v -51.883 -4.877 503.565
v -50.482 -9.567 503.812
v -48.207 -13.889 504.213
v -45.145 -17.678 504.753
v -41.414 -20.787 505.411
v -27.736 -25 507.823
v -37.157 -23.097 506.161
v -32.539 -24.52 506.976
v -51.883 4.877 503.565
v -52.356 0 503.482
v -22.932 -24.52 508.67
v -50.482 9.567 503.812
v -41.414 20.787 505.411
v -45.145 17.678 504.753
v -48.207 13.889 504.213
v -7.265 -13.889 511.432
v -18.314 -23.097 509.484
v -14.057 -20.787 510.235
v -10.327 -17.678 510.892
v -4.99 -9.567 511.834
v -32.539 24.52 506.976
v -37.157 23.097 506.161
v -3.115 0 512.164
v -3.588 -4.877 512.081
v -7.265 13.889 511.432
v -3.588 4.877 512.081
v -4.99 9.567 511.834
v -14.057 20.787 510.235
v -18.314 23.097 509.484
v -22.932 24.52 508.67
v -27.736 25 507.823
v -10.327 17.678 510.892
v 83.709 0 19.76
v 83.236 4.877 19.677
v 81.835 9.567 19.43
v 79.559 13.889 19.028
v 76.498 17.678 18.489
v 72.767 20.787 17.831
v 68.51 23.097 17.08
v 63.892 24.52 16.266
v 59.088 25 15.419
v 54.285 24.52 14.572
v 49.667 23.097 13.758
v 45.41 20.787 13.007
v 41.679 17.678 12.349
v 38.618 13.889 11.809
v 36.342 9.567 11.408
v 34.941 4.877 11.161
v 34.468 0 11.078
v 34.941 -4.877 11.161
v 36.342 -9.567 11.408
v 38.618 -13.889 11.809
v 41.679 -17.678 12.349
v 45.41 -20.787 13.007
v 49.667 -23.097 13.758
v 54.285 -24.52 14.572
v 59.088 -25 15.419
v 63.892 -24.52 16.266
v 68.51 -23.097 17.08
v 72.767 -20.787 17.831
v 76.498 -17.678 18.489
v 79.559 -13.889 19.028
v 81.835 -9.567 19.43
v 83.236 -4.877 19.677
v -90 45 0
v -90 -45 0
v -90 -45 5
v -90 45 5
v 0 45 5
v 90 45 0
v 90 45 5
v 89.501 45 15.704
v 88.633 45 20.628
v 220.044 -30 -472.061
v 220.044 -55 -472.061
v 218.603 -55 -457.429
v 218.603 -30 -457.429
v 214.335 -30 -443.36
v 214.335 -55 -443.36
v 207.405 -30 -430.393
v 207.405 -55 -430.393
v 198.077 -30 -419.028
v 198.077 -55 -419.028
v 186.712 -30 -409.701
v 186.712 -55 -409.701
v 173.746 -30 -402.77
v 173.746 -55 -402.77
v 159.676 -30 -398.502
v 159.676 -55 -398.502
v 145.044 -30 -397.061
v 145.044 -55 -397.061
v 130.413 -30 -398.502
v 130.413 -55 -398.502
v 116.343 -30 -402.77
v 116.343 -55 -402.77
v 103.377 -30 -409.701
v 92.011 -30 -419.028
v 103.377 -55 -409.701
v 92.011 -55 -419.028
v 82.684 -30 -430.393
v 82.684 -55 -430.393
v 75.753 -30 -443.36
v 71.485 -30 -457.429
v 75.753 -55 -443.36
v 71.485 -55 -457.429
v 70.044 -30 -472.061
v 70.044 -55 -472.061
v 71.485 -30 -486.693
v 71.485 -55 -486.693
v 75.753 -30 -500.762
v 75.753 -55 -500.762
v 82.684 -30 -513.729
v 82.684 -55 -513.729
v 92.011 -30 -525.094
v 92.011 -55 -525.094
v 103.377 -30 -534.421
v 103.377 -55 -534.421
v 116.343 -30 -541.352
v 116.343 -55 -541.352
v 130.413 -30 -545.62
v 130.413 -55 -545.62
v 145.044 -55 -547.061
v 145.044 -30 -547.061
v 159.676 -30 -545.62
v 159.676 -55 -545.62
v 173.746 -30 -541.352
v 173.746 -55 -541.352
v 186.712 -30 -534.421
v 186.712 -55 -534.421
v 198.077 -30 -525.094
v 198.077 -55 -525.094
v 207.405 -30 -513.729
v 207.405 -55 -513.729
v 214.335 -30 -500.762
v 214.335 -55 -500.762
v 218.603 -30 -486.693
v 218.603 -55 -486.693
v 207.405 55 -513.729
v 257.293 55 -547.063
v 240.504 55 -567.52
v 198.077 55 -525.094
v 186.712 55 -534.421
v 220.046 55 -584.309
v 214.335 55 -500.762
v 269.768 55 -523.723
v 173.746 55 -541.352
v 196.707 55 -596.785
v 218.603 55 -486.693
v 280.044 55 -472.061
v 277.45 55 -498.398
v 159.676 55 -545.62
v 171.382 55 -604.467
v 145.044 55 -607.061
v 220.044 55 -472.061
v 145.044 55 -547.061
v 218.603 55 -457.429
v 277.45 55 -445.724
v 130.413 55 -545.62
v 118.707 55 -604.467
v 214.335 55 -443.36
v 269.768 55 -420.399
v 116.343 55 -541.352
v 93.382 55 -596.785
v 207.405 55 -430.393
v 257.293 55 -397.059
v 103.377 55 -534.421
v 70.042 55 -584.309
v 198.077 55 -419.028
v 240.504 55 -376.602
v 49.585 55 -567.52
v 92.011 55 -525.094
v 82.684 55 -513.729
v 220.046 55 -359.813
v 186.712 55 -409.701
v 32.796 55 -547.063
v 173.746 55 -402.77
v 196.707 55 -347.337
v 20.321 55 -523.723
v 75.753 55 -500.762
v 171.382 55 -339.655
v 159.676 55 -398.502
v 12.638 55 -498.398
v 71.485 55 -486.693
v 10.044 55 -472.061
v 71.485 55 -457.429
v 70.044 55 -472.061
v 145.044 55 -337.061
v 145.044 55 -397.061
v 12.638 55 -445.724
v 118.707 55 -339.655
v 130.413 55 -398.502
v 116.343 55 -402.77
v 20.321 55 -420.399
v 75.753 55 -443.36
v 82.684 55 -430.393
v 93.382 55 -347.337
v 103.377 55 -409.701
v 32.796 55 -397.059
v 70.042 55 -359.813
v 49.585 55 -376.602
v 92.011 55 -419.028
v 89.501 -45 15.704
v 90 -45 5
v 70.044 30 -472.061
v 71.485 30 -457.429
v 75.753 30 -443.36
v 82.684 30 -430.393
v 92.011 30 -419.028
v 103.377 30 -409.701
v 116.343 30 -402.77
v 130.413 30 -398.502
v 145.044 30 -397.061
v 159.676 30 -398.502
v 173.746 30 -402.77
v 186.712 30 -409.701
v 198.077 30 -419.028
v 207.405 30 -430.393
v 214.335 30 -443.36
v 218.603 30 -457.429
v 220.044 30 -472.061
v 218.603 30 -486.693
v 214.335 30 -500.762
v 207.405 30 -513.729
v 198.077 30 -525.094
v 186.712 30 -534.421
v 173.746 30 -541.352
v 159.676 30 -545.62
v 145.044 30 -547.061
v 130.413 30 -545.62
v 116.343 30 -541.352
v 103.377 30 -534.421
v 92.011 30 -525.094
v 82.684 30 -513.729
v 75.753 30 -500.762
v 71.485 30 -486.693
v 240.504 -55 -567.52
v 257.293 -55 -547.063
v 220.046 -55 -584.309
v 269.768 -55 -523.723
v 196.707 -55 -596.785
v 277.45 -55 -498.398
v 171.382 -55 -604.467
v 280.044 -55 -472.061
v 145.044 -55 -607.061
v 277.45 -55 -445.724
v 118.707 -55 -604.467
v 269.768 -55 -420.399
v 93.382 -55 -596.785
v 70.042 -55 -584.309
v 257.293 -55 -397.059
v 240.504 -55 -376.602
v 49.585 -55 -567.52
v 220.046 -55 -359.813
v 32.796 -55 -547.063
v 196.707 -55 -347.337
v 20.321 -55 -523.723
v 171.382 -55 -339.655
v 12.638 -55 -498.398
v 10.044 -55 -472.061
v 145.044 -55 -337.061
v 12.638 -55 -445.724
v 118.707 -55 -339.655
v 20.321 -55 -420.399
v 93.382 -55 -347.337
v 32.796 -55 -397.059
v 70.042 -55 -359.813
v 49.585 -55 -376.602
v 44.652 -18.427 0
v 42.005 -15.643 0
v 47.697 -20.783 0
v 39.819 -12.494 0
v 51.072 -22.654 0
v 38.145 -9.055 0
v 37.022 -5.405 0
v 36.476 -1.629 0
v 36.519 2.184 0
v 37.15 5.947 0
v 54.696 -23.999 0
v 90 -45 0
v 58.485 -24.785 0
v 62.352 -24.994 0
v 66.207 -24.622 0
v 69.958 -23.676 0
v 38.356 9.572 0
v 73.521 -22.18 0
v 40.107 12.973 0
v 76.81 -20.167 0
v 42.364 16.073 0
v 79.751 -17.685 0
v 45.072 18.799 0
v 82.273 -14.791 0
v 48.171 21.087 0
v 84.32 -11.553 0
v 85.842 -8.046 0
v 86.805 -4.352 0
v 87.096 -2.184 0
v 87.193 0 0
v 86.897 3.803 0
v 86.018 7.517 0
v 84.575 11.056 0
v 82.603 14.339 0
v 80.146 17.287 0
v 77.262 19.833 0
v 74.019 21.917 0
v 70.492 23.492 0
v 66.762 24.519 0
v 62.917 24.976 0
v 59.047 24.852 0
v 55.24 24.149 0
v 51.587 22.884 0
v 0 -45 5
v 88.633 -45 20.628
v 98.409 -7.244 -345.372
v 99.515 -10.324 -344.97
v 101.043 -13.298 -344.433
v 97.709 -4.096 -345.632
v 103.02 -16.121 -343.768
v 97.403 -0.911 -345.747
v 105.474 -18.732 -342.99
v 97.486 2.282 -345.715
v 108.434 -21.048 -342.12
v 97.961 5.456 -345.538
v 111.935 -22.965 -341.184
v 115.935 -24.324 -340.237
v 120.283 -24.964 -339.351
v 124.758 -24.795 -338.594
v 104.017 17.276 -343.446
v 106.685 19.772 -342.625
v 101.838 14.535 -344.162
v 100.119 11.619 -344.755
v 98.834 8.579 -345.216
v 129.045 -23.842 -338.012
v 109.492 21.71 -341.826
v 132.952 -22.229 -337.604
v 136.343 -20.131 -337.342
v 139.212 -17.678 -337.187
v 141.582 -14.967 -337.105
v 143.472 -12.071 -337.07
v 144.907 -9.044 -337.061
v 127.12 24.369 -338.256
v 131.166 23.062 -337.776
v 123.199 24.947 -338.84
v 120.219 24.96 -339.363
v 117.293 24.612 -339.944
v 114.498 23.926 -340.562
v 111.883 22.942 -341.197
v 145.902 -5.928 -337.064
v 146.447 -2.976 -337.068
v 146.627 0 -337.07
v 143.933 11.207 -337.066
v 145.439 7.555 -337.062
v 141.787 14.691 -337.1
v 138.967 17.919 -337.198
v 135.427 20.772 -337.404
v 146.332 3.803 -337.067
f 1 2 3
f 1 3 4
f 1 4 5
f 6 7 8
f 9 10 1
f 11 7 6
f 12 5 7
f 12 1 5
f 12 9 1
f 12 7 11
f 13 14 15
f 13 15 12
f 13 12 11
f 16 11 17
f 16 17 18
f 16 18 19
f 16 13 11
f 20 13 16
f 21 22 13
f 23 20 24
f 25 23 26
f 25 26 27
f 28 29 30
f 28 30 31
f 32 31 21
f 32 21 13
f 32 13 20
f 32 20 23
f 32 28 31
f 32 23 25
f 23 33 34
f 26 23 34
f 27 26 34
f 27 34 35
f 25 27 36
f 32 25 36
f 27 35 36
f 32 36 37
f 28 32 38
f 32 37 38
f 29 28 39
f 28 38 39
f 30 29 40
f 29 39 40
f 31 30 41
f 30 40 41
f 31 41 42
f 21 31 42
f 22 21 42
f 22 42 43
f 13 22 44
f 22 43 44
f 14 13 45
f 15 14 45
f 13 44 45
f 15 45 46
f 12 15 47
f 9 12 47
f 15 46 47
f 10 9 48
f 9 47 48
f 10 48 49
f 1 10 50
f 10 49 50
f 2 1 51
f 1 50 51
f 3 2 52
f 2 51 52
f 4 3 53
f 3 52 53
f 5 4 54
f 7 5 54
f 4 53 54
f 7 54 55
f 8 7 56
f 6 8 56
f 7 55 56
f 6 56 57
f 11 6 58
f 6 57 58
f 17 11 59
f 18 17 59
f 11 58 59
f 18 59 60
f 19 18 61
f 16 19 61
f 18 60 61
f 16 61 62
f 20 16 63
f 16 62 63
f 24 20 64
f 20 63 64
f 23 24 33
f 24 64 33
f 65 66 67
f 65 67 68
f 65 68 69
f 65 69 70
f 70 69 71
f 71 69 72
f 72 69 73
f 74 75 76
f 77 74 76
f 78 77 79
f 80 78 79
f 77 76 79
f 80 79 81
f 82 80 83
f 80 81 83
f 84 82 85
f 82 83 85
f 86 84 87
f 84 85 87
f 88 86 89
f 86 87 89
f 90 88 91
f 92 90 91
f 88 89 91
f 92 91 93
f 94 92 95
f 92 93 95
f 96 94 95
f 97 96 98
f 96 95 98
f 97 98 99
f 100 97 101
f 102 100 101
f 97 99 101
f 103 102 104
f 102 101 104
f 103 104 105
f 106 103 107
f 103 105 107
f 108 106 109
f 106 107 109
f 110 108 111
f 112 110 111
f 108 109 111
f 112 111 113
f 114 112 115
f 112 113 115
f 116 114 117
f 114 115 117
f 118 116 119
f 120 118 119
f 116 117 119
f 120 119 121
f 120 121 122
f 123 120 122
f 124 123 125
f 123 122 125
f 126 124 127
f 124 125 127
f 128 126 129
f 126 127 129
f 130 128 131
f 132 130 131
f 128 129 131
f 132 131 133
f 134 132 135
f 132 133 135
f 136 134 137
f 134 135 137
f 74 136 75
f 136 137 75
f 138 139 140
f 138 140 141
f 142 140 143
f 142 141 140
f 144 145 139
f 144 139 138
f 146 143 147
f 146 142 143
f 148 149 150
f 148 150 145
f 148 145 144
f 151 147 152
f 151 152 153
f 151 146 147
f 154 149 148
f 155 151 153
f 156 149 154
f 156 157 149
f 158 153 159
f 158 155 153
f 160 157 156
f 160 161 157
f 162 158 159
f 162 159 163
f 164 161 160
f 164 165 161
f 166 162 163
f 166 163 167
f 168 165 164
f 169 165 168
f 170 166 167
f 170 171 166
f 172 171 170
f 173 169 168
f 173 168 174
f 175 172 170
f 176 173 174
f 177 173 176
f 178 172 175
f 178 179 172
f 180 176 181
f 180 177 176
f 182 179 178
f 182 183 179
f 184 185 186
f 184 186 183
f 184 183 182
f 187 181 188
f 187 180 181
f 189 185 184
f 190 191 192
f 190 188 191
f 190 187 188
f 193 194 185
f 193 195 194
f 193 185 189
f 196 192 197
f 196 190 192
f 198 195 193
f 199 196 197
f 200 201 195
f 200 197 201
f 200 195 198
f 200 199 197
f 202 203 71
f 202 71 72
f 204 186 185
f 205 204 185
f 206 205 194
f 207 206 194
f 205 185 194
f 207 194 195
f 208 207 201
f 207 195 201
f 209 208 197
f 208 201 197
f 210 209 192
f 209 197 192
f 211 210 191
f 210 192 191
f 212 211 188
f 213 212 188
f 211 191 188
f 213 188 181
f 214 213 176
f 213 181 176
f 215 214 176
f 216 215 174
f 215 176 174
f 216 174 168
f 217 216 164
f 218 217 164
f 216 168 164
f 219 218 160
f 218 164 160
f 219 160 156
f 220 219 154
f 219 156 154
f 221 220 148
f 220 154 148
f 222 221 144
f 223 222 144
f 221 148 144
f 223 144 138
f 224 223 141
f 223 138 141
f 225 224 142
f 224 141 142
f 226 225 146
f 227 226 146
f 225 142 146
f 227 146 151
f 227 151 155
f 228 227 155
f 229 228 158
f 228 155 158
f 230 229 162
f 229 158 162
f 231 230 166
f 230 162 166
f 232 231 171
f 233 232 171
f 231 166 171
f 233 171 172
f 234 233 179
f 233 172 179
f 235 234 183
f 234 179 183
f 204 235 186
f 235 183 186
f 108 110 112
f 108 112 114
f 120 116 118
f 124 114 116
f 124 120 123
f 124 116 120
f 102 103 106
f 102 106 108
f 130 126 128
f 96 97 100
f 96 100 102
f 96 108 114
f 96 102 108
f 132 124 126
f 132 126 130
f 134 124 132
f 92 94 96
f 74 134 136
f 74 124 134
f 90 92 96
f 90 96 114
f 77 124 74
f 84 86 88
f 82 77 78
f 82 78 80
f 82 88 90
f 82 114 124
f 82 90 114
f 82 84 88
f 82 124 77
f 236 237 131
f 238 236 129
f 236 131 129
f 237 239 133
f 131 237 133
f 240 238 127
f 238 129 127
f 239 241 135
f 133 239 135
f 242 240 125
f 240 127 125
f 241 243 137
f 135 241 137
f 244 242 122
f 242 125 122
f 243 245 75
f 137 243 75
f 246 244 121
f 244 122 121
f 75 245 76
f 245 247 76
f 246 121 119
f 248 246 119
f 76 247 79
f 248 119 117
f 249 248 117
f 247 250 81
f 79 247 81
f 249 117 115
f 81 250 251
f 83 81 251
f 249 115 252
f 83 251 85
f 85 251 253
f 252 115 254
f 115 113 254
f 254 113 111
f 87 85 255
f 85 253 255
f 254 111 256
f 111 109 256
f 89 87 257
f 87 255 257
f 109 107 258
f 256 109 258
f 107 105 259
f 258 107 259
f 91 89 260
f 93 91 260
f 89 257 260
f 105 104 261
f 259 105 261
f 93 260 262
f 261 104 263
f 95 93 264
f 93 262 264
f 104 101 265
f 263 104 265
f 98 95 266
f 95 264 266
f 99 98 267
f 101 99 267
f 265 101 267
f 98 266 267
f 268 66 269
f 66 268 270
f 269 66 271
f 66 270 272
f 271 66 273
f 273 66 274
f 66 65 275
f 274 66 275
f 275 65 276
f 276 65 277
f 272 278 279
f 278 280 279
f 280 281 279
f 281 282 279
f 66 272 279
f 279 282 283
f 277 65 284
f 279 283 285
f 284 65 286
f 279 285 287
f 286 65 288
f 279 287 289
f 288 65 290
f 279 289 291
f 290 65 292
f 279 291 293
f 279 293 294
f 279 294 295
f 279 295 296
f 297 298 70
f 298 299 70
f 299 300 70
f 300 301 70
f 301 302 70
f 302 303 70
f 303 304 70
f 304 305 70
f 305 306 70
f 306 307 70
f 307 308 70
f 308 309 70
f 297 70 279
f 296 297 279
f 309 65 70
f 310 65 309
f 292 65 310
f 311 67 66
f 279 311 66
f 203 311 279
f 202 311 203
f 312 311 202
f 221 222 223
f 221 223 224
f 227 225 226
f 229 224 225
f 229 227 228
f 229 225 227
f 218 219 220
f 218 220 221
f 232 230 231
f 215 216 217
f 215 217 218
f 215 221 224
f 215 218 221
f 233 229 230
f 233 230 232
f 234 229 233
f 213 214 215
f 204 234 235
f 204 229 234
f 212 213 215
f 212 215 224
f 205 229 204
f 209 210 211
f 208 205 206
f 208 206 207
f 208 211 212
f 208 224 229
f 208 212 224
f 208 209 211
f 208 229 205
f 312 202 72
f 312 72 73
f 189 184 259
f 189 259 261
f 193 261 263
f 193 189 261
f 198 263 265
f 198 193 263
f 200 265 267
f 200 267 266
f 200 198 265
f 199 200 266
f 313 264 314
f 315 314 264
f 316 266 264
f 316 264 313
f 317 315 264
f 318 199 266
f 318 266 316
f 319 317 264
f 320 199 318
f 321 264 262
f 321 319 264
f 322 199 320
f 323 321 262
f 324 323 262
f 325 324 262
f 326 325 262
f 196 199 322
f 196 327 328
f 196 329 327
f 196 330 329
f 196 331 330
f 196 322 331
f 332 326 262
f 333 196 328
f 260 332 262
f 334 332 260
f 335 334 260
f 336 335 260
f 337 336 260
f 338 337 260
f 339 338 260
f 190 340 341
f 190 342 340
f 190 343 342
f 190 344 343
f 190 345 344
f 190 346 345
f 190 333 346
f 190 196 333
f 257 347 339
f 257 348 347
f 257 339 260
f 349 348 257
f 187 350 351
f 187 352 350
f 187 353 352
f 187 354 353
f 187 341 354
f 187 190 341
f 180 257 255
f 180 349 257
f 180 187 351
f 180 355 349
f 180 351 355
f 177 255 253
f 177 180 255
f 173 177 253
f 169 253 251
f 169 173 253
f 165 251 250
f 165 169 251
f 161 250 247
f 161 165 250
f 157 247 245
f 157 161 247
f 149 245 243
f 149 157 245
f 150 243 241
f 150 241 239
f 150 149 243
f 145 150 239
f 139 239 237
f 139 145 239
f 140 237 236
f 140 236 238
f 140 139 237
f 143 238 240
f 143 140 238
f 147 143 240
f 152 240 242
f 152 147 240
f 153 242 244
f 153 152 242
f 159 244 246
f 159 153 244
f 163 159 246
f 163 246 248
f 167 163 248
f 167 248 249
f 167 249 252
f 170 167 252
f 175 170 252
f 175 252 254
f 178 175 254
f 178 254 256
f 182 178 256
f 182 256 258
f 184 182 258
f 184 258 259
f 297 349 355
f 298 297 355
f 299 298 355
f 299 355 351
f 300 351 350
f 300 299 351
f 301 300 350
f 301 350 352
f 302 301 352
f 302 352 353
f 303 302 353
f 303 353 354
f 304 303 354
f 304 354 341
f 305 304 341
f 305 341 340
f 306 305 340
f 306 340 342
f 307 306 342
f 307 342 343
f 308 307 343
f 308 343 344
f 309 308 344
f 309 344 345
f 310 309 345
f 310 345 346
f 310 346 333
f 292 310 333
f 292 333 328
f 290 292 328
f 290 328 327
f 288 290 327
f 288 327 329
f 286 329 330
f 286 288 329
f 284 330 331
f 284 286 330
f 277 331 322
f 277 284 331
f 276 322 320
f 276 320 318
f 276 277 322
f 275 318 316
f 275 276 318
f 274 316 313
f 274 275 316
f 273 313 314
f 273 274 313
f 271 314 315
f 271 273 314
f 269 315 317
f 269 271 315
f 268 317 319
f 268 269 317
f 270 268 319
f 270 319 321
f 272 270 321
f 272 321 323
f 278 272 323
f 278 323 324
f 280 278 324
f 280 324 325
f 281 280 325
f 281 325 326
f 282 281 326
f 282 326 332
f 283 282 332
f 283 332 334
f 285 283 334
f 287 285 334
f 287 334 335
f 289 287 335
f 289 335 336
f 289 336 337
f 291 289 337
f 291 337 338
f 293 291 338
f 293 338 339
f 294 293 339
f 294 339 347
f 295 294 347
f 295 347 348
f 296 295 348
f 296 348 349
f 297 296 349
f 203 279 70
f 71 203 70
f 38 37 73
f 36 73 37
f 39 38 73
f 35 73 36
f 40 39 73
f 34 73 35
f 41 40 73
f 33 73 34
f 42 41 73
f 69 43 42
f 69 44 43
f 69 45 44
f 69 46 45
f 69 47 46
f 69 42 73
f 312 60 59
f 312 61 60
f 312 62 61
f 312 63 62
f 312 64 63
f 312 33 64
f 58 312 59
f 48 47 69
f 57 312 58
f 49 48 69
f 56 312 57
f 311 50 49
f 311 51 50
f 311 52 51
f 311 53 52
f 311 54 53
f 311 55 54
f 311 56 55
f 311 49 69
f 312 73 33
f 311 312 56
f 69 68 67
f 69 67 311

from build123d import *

# Parameters (mm, degrees)
F0_W      = 180
F0_H      = 90
F1_DEPTH  = 5
F3_DEPTH  = 90
F4_R      = 25
F5_DEPTH  = 495
F6_DEPTH  = 500
F9_R      = 135
F10_DEPTH = 55
F11_R     = 75
F12_DEPTH = 25
F13_R     = 75
F14_DEPTH = 25


with BuildPart() as f1:
    # F0 (on Top) → F1 (new body)
    with BuildSketch(Plane.XY):
        Rectangle(F0_W, F0_H)
    extrude(amount=F1_DEPTH)

    # F2 (on face) → F3 (join)
    with BuildSketch(Plane.XZ.offset(45)):
        Polygon((88.6326977711, 20.62833599), (0, 5), (28.4956841358, 5), (89.5009386594, 15.704297225), align=None)
        Polygon((89.5009386594, 15.704297225), (28.4956841358, 5), (90, 5), align=None)
    extrude(amount=-F3_DEPTH)

    # F4 (on face) → F5 (join)
    with BuildSketch(Plane(origin=(-0.8550503583, 0, 4.849231552), x_dir=(0.984807753, 0, 0.1736481777), z_dir=(-0.1736481777, 0, 0.984807753))):
        with Locations((60.8682408883, 0)):
            Circle(F4_R)
    extrude(amount=-F5_DEPTH)

    # F4 (on face) → F6 (join)
    with BuildSketch(Plane(origin=(-0.8550503583, 0, 4.849231552), x_dir=(0.984807753, 0, 0.1736481777), z_dir=(-0.1736481777, 0, 0.984807753))):
        with Locations((60.8682408883, 0)):
            Circle(F4_R)
    extrude(amount=F6_DEPTH)

    # F9 (on line) → F10 (join, symmetric)
    with BuildSketch(Plane(origin=(0, 0, 0), x_dir=(-1, 0, 0), z_dir=(0, 1, 0))):
        with Locations((-145.0443131259, -472.060947081)):
            Circle(F9_R)
    extrude(amount=F10_DEPTH, both=True)

    # F11 (on face) → F12 (cut)
    with BuildSketch(Plane.XZ.offset(55)):
        with Locations((145.0443131259, -472.060947081)):
            Circle(F11_R)
    extrude(amount=-F12_DEPTH, mode=Mode.SUBTRACT)

    # F13 (on face) → F14 (cut)
    with BuildSketch(Plane(origin=(0, 55, 0), x_dir=(-1, 0, 0), z_dir=(0, 1, 0))):
        with Locations((-145.0443131259, -472.060947081)):
            Circle(F13_R)
    extrude(amount=-F14_DEPTH, mode=Mode.SUBTRACT)


solid = f1.part
